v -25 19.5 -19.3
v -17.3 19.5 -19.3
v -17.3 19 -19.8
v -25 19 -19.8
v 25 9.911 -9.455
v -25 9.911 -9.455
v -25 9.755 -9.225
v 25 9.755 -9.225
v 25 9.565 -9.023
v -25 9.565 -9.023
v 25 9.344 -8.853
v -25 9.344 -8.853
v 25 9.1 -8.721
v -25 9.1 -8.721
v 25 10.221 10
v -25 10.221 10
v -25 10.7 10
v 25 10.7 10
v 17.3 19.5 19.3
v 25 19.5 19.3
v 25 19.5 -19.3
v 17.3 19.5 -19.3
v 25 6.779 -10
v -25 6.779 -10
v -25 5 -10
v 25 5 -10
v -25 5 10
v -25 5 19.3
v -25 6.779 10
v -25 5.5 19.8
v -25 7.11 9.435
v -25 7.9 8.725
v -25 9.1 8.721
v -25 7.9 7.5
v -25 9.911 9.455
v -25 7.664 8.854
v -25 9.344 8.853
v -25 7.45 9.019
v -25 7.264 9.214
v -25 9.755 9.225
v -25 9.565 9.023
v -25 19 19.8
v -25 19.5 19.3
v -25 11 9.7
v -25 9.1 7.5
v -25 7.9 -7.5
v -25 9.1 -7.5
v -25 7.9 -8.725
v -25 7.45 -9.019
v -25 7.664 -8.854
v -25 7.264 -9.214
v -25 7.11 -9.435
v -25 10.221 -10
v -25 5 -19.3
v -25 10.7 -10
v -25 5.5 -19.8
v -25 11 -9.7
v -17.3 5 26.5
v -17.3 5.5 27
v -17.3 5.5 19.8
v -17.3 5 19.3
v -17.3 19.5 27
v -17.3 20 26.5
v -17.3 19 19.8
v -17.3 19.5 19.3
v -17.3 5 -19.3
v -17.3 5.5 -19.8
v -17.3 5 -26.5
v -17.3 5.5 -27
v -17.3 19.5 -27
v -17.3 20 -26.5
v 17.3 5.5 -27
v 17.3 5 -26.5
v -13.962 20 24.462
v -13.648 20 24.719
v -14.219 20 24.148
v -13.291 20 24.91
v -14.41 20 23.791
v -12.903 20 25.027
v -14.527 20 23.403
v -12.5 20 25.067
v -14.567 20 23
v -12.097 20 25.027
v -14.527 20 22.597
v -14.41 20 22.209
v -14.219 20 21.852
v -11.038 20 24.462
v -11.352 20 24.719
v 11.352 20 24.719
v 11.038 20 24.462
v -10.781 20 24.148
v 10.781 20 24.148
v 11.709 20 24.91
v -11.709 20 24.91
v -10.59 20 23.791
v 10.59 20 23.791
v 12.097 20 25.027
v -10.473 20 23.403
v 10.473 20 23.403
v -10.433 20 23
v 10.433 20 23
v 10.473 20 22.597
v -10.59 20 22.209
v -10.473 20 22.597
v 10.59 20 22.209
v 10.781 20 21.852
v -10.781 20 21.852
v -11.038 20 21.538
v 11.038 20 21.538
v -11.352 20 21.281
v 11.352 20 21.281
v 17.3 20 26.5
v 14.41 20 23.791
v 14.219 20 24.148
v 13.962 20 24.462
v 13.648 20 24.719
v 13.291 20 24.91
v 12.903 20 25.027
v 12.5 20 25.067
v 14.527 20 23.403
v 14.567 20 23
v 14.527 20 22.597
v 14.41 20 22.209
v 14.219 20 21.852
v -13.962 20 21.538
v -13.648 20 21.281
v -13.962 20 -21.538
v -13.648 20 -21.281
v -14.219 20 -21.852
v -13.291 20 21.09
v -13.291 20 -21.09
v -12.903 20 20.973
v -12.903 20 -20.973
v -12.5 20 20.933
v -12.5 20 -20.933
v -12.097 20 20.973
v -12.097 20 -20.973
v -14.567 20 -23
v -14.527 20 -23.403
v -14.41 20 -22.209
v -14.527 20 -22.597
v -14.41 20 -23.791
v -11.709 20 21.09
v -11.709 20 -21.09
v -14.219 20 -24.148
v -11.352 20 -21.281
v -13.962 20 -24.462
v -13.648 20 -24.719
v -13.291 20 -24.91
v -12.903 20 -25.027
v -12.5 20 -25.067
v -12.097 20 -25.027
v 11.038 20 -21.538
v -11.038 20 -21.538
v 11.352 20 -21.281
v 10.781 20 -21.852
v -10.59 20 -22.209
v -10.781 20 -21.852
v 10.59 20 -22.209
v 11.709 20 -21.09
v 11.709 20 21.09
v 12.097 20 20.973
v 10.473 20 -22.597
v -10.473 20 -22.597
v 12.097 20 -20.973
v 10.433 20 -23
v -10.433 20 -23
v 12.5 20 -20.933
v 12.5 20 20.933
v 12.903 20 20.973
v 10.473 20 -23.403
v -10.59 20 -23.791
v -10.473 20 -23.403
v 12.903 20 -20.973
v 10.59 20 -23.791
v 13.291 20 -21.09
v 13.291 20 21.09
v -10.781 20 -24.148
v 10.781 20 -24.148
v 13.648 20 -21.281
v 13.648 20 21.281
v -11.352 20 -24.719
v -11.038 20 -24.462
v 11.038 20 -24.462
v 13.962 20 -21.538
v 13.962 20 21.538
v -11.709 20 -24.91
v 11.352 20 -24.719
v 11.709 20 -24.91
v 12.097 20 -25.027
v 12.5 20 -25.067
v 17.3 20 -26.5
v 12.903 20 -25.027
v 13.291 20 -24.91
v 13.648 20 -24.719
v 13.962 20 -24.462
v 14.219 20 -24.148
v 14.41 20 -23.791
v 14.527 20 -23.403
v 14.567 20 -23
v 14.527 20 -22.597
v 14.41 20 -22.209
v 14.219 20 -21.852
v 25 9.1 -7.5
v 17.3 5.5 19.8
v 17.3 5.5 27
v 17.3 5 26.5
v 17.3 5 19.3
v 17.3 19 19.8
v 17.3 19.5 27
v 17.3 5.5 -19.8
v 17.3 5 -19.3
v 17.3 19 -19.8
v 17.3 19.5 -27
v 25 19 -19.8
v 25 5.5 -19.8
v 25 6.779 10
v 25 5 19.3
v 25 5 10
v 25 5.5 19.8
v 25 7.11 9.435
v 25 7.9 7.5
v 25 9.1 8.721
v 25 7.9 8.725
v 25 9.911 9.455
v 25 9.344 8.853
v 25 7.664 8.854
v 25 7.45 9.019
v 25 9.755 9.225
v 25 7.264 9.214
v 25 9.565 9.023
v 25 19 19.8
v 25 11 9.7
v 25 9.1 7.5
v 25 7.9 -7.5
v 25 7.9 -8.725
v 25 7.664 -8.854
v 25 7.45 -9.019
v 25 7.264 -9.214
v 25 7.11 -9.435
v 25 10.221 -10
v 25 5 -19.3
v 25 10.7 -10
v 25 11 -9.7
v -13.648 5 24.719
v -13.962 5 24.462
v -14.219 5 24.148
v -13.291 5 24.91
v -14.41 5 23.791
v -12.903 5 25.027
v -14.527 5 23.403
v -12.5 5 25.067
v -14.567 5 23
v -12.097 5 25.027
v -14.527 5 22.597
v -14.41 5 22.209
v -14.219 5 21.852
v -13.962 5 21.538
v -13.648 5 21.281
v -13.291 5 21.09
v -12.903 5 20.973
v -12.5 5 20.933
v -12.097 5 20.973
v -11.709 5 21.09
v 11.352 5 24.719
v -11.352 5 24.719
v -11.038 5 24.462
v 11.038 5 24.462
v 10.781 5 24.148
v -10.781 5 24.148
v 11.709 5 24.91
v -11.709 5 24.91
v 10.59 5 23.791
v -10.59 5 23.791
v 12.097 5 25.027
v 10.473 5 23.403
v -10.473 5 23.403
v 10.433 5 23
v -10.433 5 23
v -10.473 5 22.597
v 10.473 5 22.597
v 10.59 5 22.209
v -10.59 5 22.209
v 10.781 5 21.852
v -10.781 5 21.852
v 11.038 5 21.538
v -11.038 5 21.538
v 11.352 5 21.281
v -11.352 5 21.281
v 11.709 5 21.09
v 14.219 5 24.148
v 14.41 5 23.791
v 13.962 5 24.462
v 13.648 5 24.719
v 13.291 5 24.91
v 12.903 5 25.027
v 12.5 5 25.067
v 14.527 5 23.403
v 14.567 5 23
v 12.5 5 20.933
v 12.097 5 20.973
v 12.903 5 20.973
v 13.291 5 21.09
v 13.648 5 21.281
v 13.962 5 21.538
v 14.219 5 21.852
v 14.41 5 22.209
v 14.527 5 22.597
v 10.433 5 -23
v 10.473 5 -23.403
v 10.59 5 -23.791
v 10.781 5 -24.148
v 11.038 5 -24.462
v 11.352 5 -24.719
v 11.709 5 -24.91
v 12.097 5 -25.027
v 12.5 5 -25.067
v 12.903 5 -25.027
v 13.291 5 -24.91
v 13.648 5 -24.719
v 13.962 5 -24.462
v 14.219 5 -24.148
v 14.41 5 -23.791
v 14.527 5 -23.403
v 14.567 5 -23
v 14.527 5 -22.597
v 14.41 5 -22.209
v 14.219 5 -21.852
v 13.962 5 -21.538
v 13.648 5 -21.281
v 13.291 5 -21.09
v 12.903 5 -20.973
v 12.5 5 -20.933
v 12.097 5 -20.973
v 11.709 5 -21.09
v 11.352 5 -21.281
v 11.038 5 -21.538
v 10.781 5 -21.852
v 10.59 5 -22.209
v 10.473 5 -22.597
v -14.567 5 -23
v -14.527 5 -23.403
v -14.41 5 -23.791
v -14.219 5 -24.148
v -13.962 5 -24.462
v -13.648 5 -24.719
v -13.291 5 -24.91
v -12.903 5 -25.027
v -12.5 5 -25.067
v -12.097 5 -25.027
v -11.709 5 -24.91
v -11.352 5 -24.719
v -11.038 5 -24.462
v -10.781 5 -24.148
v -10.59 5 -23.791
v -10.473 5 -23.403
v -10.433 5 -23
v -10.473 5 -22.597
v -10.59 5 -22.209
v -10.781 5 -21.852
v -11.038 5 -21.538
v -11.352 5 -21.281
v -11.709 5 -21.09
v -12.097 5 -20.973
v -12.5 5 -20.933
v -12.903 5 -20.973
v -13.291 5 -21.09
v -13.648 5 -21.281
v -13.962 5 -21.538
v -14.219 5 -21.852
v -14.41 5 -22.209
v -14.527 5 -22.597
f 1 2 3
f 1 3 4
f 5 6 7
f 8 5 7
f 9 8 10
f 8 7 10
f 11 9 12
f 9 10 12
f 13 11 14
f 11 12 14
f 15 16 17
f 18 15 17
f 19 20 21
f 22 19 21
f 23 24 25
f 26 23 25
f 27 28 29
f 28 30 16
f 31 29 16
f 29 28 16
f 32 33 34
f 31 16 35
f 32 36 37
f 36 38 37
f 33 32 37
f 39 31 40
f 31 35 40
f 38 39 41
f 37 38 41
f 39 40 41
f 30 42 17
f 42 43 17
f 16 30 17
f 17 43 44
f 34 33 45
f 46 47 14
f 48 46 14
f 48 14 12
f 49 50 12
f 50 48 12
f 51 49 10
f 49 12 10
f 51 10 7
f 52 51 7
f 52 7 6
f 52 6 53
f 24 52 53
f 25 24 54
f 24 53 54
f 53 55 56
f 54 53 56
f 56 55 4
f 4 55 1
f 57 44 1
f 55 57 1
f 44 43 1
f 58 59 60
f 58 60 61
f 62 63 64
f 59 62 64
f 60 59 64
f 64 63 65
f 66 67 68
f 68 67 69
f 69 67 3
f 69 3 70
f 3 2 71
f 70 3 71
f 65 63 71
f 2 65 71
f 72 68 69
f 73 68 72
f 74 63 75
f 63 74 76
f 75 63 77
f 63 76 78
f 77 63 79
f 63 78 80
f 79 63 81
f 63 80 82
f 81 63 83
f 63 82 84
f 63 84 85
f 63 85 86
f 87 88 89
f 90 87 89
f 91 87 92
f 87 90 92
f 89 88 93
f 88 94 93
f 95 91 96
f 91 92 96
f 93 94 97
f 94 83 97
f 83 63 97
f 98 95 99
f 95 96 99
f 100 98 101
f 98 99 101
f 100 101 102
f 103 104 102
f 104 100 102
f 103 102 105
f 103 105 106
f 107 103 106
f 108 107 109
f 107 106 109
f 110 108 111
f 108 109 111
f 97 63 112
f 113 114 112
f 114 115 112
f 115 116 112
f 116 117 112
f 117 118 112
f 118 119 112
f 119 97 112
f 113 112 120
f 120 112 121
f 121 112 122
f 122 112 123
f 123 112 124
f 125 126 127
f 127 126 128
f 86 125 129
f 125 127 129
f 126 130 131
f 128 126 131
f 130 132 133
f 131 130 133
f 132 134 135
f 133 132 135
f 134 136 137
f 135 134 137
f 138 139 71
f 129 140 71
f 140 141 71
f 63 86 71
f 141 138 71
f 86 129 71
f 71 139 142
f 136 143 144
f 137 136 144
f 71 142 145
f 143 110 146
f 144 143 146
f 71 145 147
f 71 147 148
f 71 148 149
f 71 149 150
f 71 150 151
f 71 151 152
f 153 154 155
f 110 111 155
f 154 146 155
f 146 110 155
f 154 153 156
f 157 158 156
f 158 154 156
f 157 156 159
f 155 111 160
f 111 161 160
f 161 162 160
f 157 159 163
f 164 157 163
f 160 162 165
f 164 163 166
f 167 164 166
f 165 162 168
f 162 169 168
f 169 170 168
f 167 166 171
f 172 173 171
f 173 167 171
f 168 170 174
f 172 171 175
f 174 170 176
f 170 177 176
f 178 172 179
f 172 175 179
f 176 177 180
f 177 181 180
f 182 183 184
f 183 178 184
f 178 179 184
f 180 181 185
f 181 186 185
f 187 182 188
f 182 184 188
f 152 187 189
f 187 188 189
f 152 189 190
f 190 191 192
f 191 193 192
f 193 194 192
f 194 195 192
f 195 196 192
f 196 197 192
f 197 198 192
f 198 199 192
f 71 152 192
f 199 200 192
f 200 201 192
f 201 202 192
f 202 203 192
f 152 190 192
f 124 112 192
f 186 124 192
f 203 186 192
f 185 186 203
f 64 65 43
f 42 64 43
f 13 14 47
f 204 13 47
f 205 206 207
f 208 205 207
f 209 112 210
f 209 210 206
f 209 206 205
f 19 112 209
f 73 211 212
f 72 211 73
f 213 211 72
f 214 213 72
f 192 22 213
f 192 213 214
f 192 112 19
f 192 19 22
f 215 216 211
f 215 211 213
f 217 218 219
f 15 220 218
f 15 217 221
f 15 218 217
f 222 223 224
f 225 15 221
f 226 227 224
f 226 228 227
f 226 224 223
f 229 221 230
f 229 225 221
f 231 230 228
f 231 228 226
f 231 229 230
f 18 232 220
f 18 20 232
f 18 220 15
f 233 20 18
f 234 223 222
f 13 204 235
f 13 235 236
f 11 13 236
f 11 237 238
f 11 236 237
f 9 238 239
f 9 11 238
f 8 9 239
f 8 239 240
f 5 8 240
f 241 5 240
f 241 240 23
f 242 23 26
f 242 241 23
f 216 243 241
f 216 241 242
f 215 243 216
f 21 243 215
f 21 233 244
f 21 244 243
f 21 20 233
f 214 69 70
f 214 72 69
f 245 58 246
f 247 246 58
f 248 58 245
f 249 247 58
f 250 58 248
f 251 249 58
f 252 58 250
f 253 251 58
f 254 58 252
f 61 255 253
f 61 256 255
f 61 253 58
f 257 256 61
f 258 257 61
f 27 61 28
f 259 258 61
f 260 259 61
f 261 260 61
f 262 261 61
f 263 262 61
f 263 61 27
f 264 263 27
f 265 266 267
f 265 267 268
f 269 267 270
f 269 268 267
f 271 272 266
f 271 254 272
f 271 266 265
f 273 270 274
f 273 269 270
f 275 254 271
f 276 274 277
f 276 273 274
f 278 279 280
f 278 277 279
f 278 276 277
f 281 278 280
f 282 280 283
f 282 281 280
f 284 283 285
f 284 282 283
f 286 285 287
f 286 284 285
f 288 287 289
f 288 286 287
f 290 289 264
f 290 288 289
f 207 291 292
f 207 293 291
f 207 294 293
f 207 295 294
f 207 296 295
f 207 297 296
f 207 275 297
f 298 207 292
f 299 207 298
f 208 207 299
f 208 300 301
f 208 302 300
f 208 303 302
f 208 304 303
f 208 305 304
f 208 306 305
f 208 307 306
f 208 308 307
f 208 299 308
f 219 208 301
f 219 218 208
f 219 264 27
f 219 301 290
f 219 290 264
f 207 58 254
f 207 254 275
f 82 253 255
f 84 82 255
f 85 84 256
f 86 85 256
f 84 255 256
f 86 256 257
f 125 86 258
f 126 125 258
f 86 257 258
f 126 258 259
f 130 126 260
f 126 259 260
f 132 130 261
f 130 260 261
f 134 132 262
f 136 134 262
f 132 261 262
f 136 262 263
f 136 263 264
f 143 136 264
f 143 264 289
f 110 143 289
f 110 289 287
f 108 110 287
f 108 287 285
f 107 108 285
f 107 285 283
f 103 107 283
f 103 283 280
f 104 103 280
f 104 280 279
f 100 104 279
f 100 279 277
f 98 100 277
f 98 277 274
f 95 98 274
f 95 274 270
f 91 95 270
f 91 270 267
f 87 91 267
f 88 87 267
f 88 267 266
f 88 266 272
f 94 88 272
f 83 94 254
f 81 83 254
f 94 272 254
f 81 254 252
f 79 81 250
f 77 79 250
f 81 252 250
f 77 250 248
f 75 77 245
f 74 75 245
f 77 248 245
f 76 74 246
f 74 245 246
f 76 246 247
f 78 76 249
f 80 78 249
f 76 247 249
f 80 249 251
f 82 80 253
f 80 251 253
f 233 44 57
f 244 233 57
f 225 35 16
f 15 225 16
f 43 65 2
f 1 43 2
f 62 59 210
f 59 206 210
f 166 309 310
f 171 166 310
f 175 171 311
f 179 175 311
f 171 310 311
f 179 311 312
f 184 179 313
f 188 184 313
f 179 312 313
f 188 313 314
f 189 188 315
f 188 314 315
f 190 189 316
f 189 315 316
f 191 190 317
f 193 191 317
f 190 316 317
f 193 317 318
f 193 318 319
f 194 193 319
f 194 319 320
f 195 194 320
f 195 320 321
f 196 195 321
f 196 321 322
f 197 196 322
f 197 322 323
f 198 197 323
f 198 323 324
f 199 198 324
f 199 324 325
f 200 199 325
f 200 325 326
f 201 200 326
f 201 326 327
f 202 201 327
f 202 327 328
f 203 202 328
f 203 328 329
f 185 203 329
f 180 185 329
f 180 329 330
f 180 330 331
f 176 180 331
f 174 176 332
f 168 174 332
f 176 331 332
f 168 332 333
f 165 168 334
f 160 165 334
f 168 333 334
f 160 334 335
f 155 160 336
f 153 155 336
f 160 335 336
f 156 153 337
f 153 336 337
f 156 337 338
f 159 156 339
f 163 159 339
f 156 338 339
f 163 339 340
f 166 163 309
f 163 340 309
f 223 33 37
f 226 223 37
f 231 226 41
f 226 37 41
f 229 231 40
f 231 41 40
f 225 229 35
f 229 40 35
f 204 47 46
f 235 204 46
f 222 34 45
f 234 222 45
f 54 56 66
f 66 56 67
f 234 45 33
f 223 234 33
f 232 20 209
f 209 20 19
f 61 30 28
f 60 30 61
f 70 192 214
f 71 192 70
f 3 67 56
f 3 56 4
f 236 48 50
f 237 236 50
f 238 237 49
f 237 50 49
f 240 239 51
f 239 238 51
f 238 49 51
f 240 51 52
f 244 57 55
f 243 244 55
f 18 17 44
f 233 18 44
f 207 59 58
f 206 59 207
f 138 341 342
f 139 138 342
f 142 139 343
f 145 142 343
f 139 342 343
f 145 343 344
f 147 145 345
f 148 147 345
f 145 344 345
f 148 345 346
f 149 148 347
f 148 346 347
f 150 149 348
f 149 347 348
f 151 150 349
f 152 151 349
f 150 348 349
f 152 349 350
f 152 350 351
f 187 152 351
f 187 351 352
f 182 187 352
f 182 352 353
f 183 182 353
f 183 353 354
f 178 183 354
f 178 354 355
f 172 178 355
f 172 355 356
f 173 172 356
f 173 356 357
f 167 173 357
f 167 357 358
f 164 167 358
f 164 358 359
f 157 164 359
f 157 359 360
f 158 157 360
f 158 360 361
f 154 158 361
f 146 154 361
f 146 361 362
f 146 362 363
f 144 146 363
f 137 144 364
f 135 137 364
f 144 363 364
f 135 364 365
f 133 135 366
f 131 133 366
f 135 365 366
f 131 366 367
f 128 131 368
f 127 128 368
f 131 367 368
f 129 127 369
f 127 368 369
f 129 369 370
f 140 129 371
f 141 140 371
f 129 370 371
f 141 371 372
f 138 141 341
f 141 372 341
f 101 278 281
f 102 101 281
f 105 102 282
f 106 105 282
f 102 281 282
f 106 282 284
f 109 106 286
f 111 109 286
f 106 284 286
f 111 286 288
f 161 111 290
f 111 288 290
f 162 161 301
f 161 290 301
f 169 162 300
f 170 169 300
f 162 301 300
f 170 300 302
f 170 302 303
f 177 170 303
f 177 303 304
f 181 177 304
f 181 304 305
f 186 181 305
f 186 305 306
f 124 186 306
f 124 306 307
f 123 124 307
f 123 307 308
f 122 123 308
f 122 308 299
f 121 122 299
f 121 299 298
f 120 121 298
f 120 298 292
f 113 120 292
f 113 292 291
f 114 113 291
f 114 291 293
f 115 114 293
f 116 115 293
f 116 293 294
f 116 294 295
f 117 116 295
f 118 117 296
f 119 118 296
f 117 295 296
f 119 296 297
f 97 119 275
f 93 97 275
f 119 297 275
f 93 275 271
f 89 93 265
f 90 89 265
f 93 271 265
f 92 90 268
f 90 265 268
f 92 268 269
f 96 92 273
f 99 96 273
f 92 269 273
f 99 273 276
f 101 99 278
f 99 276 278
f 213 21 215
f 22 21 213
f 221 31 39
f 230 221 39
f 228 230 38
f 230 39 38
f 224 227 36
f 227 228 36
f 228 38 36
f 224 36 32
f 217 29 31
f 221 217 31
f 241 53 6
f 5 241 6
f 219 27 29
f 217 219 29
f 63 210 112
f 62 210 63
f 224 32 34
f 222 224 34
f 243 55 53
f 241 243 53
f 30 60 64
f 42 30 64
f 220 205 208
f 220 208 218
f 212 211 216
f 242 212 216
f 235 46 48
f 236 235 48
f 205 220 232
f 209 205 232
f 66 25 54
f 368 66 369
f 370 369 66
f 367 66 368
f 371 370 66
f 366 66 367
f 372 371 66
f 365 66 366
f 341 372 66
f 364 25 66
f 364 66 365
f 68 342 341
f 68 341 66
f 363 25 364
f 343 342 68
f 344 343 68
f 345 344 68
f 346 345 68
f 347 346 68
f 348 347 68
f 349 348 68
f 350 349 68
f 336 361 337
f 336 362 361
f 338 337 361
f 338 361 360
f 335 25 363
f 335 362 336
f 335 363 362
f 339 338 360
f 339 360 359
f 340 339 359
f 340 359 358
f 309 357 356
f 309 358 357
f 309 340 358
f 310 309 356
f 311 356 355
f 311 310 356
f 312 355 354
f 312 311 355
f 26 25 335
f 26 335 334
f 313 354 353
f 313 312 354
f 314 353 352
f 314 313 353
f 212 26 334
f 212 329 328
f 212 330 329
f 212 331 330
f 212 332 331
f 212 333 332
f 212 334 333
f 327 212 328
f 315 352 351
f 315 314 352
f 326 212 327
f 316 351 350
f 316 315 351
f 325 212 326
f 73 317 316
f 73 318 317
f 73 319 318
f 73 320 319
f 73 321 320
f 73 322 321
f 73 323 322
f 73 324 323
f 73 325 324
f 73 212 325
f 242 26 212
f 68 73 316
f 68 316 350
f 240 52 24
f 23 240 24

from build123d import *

# Parameters (mm, degrees)
SKETCH1_W               = 39.6
SKETCH1_H               = 14.5
BOSS_EXTRUDE1_DEPTH     = 25
SKETCH2_W               = 54
SKETCH2_H               = 15
BOSS_EXTRUDE2_DEPTH     = 17.3
CUT_EXTRUDE1_DEPTH      = 42.880783183
CUT_EXTRUDE1_DEPTH_BACK = 42.880783183
CHAMFER1_SIZE           = 0.5
CHAMFER2_SIZE           = 0.5
CHAMFER3_SIZE           = 0.5
CHAMFER4_SIZE           = 0.5
TAP1_D                  = 4.134
LPATTERN1_COUNT         = 2
LPATTERN1_PITCH         = 25
LPATTERN1_COUNT_DIR2    = 2
LPATTERN1_PITCH_DIR2    = 46


with BuildPart() as part:
    # Sketch1 → Boss-Extrude1 (new, symmetric)
    with BuildSketch(Plane(origin=(0, 0, 0), x_dir=(0, 0, -1), z_dir=(1, 0, 0))):
        with Locations((0, 12.25)):
            Rectangle(SKETCH1_W, SKETCH1_H)
    extrude(amount=BOSS_EXTRUDE1_DEPTH, both=True)

    # Sketch2 → Boss-Extrude2 (add, symmetric)
    with BuildSketch(Plane(origin=(0, 0, 0), x_dir=(0, 0, -1), z_dir=(1, 0, 0))):
        with Locations((0, 12.5)):
            Rectangle(SKETCH2_W, SKETCH2_H)
    extrude(amount=BOSS_EXTRUDE2_DEPTH, both=True)

    # Sketch3 → Cut-Extrude1 (cut, two sides: drawn at the far end of the back side and taken through both)
    with BuildSketch(Plane(origin=(0, 0, 0), x_dir=(0, 0, -1), z_dir=(1, 0, 0)).offset(-CUT_EXTRUDE1_DEPTH_BACK)):
        with BuildLine():
            Line((-9.7, 11), (9.7, 11))
            Line((9.7, 11), (10, 10.7))
            Line((10, 10.7), (10, 10.221039482))
            Line((10, 10.221039482), (9.455259378, 9.911421591))
            ThreePointArc((9.455259378, 9.911421591), (9.0228024, 9.564639684), (8.720500078, 9.1))
            Line((8.720500078, 9.1), (7.5, 9.1))
            Line((7.5, 9.1), (7.5, 7.9))
            Line((7.5, 7.9), (8.724976489, 7.9))
            ThreePointArc((8.724976489, 7.9), (9.018551739, 7.450071616), (9.434780564, 7.110401858))
            Line((9.434780564, 7.110401858), (10, 6.778960518))
            Line((10, 6.778960518), (10, 0))
            Line((10, 0), (-10, 0))
            Line((-10, 0), (-10, 6.778960518))
            Line((-10, 6.778960518), (-9.434780564, 7.110401858))
            ThreePointArc((-9.434780564, 7.110401858), (-9.018551739, 7.450071616), (-8.724976489, 7.9))
            Line((-8.724976489, 7.9), (-7.5, 7.9))
            Line((-7.5, 7.9), (-7.5, 9.1))
            Line((-7.5, 9.1), (-8.720500078, 9.1))
            ThreePointArc((-8.720500078, 9.1), (-9.0228024, 9.564639684), (-9.455259378, 9.911421591))
            Line((-9.455259378, 9.911421591), (-10, 10.221039482))
            Line((-10, 10.221039482), (-10, 10.7))
            Line((-10, 10.7), (-9.7, 11))
        make_face()
    extrude(amount=CUT_EXTRUDE1_DEPTH + CUT_EXTRUDE1_DEPTH_BACK, mode=Mode.SUBTRACT)

    # Chamfer1
    chamfer1_edges = [part.edges().sort_by_distance(p)[0] for p in [
        (-21.15, 19.5, 19.8),
        (-21.15, 19.5, -19.8),
        (21.15, 19.5, 19.8),
        (21.15, 19.5, -19.8),
    ]]
    chamfer(chamfer1_edges, length=CHAMFER1_SIZE)

    # Chamfer2
    chamfer2_edges = [part.edges().sort_by_distance(p)[0] for p in [
        (0, 20, 27),
        (0, 20, -27),
    ]]
    chamfer(chamfer2_edges, length=CHAMFER2_SIZE)

    # Chamfer3
    chamfer3_edges = [part.edges().sort_by_distance(p)[0] for p in [
        (-21.15, 5, -19.8),
        (-21.15, 5, 19.8),
        (21.15, 5, -19.8),
        (21.15, 5, 19.8),
    ]]
    chamfer(chamfer3_edges, length=CHAMFER3_SIZE)

    # Chamfer4
    chamfer4_edges = [part.edges().sort_by_distance(p)[0] for p in [
        (0, 5, 27),
        (0, 5, -27),
    ]]
    chamfer(chamfer4_edges, length=CHAMFER4_SIZE)

    # Tap1 (through all)
    with Locations(Plane(origin=(0, 20, 0), x_dir=(1, 0, 0), z_dir=(0, 1, 0))):
        with Locations((-12.5, 23)):
            tap1 = Hole(TAP1_D / 2)

    # LPattern1: Tap1 2 × 2
    with Locations(*[(i * LPATTERN1_PITCH, 0, j * LPATTERN1_PITCH_DIR2) for i in range(LPATTERN1_COUNT) for j in range(LPATTERN1_COUNT_DIR2) if (i, j) != (0, 0)]):
        add(tap1, mode=Mode.SUBTRACT)


solid = part.part
